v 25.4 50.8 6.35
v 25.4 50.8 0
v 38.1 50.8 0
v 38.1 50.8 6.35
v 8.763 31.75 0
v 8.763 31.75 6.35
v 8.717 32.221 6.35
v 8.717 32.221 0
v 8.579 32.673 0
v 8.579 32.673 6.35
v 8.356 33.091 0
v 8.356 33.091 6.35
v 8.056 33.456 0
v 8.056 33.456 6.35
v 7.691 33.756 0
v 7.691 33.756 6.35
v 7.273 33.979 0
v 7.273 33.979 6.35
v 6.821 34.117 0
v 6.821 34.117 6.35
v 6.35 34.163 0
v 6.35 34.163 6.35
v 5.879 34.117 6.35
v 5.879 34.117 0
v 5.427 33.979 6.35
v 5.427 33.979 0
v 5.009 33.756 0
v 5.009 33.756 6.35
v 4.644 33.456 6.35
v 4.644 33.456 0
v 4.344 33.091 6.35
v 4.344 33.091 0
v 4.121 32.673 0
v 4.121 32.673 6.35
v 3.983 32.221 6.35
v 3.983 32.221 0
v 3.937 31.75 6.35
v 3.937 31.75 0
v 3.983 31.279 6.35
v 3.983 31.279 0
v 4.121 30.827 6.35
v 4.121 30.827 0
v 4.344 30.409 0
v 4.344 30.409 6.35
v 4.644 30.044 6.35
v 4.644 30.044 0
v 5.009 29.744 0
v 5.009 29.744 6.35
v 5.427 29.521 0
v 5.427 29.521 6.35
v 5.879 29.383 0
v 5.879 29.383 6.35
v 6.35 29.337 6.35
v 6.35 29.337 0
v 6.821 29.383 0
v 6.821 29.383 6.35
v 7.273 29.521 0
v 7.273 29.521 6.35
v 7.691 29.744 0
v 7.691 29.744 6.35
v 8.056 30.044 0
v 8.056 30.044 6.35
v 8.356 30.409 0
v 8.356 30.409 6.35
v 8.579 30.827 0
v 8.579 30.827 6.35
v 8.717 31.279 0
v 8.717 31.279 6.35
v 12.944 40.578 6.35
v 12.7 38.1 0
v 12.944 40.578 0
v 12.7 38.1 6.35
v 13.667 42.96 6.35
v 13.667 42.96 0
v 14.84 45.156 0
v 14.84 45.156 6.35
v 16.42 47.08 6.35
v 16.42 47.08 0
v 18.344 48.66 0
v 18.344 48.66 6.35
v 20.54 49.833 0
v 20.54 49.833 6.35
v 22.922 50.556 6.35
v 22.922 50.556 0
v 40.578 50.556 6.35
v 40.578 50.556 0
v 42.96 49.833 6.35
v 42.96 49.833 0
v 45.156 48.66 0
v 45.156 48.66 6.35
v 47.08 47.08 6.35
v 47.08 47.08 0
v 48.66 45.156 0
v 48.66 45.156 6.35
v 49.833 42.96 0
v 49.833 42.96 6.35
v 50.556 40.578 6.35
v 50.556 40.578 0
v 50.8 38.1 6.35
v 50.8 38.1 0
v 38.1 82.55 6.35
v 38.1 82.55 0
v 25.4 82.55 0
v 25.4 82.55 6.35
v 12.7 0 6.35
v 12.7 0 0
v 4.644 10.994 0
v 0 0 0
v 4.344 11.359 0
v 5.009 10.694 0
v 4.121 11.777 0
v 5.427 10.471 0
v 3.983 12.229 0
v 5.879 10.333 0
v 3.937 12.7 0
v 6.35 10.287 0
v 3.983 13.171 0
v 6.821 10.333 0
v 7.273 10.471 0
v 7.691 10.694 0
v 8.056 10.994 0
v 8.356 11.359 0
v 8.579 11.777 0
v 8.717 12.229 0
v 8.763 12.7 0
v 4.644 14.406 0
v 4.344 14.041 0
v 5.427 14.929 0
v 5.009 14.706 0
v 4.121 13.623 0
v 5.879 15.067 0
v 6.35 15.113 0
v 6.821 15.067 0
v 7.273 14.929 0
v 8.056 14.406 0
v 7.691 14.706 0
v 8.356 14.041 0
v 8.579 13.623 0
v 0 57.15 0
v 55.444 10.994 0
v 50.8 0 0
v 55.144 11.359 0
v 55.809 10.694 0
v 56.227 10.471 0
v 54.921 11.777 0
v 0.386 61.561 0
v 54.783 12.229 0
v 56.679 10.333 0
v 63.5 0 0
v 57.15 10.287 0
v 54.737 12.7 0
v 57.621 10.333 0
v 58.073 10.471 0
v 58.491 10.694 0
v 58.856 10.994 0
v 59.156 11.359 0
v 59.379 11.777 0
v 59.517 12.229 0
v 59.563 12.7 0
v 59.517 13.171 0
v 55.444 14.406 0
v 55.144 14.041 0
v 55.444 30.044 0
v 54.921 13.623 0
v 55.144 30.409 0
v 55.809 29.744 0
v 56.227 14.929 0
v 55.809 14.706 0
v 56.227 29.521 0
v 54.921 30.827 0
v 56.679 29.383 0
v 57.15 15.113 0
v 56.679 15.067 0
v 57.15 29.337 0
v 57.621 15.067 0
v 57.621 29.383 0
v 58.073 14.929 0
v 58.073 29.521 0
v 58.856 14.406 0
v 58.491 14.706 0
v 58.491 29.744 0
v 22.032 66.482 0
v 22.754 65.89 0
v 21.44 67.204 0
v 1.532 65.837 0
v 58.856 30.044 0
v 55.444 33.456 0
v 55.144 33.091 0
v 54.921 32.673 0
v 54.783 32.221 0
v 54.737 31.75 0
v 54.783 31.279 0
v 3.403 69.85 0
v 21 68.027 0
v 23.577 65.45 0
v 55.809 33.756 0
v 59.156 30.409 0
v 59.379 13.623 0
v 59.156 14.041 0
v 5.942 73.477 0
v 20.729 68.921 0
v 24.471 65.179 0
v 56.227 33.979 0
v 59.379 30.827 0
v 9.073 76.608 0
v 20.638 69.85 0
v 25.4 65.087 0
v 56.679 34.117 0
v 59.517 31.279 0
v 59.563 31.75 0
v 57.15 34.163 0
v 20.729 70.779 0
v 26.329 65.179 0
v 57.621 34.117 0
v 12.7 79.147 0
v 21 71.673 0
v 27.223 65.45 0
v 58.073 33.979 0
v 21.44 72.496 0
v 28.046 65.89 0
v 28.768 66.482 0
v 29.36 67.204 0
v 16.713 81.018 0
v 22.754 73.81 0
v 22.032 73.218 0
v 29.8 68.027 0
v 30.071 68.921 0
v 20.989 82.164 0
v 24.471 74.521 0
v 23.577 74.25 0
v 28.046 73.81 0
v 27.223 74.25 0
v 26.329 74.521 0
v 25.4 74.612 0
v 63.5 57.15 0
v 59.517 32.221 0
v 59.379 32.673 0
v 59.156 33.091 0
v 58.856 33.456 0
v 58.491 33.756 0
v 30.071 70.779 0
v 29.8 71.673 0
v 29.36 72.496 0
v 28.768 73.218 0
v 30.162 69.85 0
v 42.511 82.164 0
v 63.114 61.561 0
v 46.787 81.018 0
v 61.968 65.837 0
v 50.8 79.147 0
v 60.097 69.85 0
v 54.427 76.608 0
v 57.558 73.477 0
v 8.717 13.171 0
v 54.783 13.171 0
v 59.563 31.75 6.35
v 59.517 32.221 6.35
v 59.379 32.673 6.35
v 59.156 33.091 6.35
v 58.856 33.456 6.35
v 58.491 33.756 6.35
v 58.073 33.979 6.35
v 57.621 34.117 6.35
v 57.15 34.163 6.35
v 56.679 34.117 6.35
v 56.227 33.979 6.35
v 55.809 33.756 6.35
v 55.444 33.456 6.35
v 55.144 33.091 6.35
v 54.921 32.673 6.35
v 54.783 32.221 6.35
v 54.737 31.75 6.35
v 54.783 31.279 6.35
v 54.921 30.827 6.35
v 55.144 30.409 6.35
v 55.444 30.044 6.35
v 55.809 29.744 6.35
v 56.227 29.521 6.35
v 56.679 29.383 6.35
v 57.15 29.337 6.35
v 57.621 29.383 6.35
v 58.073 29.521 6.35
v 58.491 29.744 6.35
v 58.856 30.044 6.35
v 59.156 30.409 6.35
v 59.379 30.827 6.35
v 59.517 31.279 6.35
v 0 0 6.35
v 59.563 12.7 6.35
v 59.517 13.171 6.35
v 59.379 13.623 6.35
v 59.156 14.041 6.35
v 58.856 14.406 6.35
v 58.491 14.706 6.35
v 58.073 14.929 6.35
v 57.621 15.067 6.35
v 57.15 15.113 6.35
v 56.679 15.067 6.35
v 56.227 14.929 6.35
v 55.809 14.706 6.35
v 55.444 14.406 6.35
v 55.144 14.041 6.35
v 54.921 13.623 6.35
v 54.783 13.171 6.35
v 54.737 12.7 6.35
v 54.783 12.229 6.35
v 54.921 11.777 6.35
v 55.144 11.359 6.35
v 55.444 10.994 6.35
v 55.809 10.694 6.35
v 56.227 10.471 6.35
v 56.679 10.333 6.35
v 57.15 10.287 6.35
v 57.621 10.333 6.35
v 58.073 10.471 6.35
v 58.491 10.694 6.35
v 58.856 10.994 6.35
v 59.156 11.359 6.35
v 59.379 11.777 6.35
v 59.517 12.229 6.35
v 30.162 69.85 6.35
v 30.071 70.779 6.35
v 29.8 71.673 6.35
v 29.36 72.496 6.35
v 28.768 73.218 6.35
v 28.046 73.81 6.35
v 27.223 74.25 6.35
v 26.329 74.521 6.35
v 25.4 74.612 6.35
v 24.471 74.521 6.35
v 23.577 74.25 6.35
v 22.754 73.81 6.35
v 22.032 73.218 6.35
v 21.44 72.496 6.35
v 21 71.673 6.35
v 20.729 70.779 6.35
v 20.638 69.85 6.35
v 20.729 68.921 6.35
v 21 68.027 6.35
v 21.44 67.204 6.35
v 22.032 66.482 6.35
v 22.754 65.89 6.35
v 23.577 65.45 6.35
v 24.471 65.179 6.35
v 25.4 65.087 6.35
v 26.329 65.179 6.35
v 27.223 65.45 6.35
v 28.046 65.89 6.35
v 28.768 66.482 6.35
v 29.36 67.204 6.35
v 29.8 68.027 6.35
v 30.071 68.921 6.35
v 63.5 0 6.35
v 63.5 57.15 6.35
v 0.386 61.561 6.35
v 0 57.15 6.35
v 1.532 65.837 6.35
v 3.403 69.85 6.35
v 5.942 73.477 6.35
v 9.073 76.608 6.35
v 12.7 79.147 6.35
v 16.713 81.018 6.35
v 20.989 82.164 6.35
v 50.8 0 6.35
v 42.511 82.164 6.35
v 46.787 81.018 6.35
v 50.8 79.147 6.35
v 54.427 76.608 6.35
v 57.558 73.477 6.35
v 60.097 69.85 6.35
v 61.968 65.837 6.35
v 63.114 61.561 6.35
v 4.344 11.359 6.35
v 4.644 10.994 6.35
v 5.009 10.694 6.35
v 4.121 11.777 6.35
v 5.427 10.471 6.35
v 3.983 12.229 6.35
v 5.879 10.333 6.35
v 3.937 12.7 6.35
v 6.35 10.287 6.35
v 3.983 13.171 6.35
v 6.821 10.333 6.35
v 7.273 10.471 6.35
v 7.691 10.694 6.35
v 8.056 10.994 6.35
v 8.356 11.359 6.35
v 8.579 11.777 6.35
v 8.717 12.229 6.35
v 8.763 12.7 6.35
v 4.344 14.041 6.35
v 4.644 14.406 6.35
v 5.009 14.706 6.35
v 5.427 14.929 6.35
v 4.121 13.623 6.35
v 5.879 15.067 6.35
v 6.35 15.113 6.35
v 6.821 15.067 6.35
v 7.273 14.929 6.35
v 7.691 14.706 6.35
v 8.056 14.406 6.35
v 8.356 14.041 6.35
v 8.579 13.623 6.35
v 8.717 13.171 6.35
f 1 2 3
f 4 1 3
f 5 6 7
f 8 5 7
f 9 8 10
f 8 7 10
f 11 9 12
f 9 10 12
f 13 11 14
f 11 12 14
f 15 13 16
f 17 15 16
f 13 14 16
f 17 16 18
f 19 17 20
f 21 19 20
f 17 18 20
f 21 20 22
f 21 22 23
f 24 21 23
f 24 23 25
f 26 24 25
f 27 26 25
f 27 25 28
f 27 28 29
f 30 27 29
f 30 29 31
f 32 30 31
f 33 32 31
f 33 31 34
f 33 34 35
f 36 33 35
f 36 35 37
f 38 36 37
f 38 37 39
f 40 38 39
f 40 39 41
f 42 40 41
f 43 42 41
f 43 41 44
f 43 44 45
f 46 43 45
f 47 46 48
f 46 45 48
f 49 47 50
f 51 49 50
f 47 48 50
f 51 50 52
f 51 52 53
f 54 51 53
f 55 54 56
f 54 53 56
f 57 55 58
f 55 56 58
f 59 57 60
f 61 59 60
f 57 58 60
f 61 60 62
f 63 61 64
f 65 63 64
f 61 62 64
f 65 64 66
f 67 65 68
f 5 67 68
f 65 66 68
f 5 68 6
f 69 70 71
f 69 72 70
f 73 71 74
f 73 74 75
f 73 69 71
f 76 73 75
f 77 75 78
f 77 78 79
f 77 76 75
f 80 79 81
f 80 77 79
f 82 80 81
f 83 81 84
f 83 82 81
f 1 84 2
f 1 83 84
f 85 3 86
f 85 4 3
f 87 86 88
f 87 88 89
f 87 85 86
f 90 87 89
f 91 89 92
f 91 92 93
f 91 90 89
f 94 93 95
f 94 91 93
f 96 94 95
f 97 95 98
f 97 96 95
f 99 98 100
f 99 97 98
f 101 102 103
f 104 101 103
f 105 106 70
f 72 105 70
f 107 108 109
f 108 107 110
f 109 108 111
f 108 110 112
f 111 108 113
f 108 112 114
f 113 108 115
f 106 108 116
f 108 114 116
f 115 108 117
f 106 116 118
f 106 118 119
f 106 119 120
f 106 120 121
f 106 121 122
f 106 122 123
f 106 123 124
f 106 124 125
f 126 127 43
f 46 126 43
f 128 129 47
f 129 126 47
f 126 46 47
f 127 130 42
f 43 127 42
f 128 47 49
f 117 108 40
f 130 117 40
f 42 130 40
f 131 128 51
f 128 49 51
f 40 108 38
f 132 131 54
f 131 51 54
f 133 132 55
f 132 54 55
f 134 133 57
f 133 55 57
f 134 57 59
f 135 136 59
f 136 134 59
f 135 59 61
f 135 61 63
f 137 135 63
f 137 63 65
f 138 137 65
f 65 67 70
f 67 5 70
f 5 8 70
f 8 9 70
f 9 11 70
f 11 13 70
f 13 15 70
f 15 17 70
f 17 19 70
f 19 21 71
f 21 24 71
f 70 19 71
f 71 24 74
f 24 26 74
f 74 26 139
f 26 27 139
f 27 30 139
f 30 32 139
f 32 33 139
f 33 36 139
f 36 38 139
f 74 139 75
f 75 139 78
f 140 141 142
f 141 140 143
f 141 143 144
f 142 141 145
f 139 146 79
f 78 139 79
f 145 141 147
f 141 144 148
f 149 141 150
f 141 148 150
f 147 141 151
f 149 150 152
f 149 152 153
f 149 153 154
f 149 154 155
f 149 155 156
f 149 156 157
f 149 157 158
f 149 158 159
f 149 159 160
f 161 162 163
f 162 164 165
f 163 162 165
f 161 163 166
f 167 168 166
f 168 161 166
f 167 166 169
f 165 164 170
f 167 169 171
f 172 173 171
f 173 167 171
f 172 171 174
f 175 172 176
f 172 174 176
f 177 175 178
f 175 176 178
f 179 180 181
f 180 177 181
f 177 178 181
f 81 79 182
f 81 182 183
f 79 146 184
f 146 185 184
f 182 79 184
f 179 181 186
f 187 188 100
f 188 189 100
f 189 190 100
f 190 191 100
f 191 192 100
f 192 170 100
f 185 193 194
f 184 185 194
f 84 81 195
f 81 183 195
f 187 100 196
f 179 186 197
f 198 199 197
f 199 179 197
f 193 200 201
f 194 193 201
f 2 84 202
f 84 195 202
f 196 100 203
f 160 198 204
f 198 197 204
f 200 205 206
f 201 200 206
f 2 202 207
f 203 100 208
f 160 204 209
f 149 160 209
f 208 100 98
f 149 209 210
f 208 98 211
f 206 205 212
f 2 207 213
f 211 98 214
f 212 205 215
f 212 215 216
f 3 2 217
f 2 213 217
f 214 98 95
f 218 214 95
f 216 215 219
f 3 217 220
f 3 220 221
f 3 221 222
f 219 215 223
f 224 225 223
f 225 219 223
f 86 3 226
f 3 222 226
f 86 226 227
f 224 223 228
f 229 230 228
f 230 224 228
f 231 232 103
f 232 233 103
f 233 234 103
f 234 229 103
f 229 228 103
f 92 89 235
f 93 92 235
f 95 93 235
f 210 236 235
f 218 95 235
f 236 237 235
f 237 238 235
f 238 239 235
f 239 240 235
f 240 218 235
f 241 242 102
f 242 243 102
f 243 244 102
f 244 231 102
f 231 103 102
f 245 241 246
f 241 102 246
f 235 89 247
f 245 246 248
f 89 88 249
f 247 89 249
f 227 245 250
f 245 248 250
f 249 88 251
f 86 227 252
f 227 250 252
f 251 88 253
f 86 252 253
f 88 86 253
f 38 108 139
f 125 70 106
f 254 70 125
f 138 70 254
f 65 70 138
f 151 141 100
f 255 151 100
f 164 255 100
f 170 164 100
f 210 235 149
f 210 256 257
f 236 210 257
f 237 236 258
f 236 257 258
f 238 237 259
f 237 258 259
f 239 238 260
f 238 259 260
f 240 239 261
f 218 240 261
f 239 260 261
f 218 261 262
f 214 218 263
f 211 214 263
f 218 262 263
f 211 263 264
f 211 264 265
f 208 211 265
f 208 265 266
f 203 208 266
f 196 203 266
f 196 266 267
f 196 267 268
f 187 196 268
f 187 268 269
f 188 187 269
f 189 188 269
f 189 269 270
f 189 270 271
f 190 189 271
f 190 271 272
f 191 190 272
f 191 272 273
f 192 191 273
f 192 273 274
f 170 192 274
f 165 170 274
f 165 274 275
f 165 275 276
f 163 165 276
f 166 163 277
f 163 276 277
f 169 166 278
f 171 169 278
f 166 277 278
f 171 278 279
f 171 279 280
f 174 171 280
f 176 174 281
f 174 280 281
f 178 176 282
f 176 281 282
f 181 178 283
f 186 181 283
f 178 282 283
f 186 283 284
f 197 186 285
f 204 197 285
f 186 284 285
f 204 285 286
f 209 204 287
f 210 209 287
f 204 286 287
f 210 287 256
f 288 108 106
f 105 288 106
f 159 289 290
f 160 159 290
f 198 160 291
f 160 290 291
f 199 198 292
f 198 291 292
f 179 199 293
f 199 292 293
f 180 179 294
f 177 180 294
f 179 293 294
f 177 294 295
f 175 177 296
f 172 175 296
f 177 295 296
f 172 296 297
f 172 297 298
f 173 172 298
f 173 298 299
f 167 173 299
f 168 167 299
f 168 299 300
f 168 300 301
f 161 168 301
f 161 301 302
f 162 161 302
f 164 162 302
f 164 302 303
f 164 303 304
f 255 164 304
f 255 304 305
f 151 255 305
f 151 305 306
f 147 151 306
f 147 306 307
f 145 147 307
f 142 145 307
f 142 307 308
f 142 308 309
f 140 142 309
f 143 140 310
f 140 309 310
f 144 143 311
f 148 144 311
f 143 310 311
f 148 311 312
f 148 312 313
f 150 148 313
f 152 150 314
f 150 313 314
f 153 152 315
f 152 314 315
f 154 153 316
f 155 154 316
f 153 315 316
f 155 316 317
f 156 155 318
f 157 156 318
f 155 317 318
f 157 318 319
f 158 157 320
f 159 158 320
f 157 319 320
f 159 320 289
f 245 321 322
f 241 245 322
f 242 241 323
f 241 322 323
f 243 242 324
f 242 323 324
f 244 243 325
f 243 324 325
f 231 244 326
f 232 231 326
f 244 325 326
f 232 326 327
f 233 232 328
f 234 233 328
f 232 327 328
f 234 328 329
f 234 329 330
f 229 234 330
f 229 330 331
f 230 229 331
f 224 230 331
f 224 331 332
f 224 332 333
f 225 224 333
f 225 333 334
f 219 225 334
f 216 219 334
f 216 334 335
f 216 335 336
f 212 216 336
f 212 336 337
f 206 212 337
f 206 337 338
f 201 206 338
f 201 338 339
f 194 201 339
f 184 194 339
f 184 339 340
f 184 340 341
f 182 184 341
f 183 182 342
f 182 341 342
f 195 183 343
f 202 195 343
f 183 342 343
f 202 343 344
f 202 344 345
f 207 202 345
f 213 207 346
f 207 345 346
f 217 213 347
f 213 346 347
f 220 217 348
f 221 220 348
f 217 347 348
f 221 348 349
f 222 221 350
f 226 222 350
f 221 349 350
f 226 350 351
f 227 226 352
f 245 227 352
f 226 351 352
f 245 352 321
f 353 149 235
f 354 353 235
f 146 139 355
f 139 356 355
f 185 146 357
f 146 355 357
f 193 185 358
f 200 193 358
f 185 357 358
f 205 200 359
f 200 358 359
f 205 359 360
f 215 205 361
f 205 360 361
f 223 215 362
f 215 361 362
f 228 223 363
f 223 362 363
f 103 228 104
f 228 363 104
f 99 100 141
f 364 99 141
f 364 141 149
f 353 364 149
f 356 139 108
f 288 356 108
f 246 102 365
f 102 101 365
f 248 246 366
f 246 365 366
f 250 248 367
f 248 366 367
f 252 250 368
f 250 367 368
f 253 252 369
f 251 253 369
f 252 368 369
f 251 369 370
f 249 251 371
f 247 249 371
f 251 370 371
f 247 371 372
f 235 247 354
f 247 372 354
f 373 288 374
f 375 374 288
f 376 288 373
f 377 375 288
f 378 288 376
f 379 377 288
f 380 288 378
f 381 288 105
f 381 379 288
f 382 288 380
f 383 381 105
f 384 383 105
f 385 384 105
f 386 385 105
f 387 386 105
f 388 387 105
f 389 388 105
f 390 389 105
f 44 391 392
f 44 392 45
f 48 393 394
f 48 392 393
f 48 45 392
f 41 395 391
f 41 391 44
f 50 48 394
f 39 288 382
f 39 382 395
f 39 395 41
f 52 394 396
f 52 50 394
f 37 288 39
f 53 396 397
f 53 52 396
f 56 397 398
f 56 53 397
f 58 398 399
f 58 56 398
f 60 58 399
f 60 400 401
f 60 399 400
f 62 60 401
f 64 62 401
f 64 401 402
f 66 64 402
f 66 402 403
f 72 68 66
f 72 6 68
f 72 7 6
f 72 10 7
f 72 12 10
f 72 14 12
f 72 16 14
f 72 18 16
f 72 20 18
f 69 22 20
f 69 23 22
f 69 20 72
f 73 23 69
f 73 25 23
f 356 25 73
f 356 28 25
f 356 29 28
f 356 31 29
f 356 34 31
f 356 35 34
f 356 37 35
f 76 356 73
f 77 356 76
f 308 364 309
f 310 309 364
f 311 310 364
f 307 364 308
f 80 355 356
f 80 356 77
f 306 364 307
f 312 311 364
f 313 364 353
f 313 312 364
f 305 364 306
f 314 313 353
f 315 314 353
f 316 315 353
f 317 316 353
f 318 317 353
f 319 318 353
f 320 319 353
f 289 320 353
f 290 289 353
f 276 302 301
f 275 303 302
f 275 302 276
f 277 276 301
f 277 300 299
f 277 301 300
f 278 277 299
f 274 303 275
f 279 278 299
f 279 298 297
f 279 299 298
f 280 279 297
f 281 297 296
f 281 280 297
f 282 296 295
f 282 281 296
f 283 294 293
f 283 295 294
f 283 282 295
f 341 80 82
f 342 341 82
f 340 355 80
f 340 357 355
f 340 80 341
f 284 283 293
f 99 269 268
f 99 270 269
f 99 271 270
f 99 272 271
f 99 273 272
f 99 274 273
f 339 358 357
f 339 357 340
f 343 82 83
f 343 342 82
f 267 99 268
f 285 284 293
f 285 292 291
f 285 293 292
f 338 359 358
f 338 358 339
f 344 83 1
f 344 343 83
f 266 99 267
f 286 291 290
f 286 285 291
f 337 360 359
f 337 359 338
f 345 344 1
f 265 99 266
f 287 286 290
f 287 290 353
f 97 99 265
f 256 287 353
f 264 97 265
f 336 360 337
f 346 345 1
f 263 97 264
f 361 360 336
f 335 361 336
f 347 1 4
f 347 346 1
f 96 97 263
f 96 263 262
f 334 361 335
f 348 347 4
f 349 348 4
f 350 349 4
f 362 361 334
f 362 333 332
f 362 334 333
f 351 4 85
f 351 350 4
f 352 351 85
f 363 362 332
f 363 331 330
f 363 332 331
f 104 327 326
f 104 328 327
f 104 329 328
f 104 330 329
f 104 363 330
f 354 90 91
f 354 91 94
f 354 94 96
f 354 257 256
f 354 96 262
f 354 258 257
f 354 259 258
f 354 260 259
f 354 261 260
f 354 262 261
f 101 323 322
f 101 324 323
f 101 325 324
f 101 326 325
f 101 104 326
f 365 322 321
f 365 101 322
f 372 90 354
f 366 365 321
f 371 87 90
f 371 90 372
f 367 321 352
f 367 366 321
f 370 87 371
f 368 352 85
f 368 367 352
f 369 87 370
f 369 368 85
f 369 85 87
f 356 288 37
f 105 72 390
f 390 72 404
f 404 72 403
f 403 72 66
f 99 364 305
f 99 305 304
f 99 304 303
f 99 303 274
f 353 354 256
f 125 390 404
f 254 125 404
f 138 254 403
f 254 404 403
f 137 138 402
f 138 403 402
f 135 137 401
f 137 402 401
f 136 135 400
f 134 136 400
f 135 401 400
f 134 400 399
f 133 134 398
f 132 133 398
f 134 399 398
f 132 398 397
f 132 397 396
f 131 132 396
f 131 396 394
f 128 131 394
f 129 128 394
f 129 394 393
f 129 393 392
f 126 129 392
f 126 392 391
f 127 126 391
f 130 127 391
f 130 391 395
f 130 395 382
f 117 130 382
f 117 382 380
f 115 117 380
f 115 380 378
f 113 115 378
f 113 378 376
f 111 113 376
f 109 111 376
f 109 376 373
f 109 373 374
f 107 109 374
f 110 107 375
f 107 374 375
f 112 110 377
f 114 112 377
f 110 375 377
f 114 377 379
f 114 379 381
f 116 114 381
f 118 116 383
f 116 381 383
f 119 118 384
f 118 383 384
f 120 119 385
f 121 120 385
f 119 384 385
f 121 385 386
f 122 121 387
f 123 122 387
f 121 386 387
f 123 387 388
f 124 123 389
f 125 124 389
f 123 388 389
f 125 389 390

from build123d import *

# Parameters (mm, degrees)
BOSS_EXTRUDE1_DEPTH = 6.35
CUT_EXTRUDE1_REACH  = 8.35
SKETCH2_R           = 2.413
CUT_EXTRUDE2_REACH  = 8.35
SKETCH3_R           = 4.7625
FILLET1_R           = 12.7
FILLET2_R           = 25.4


with BuildPart() as part:
    # Sketch1 → Boss-Extrude1 (new body)
    with BuildSketch(Plane.XY):
        Polygon((0, 0), (12.7, 0), (12.7, 50.8), (50.8, 50.8), (50.8, 0), (63.5, 0), (63.5, 82.55), (0, 82.55), align=None)
    extrude(amount=BOSS_EXTRUDE1_DEPTH)

    # Sketch2 → Cut-Extrude1 (cut, up to next)
    with BuildSketch(Plane.XY.offset(6.35), mode=Mode.PRIVATE) as cut_extrude1_sk1:
        with Locations((6.35, 12.7)):
            Circle(SKETCH2_R)
    cut_extrude1_tool1 = extrude(cut_extrude1_sk1.sketch, amount=-CUT_EXTRUDE1_REACH, mode=Mode.PRIVATE) & part.part
    add(cut_extrude1_tool1.solids().sort_by_distance((6.35, 12.7, 6.35))[0], mode=Mode.SUBTRACT)
    # Sketch2 → Cut-Extrude1 (cut, up to next)
    with BuildSketch(Plane.XY.offset(6.35), mode=Mode.PRIVATE) as cut_extrude1_sk2:
        with Locations((6.35, 31.75)):
            Circle(SKETCH2_R)
    cut_extrude1_tool2 = extrude(cut_extrude1_sk2.sketch, amount=-CUT_EXTRUDE1_REACH, mode=Mode.PRIVATE) & part.part
    add(cut_extrude1_tool2.solids().sort_by_distance((6.35, 31.75, 6.35))[0], mode=Mode.SUBTRACT)
    # Sketch2 → Cut-Extrude1 (cut, up to next)
    with BuildSketch(Plane.XY.offset(6.35), mode=Mode.PRIVATE) as cut_extrude1_sk3:
        with Locations((57.15, 12.7)):
            Circle(SKETCH2_R)
    cut_extrude1_tool3 = extrude(cut_extrude1_sk3.sketch, amount=-CUT_EXTRUDE1_REACH, mode=Mode.PRIVATE) & part.part
    add(cut_extrude1_tool3.solids().sort_by_distance((57.15, 12.7, 6.35))[0], mode=Mode.SUBTRACT)
    # Sketch2 → Cut-Extrude1 (cut, up to next)
    with BuildSketch(Plane.XY.offset(6.35), mode=Mode.PRIVATE) as cut_extrude1_sk4:
        with Locations((57.15, 31.75)):
            Circle(SKETCH2_R)
    cut_extrude1_tool4 = extrude(cut_extrude1_sk4.sketch, amount=-CUT_EXTRUDE1_REACH, mode=Mode.PRIVATE) & part.part
    add(cut_extrude1_tool4.solids().sort_by_distance((57.15, 31.75, 6.35))[0], mode=Mode.SUBTRACT)

    # Sketch3 → Cut-Extrude2 (cut, up to next)
    with BuildSketch(Plane.XY.offset(6.35), mode=Mode.PRIVATE) as cut_extrude2_sk1:
        with Locations((25.4, 69.85)):
            Circle(SKETCH3_R)
    cut_extrude2_tool1 = extrude(cut_extrude2_sk1.sketch, amount=-CUT_EXTRUDE2_REACH, mode=Mode.PRIVATE) & part.part
    add(cut_extrude2_tool1.solids().sort_by_distance((25.4, 69.85, 6.35))[0], mode=Mode.SUBTRACT)

    # Fillet1
    fillet1_edges = [part.edges().sort_by_distance(p)[0] for p in [
        (50.8, 50.8, 3.175),
        (12.7, 50.8, 3.175),
    ]]
    fillet(fillet1_edges, radius=FILLET1_R)

    # Fillet2
    fillet2_edges = [part.edges().sort_by_distance(p)[0] for p in [
        (0, 82.55, 3.175),
        (63.5, 82.55, 3.175),
    ]]
    fillet(fillet2_edges, radius=FILLET2_R)


solid = part.part
